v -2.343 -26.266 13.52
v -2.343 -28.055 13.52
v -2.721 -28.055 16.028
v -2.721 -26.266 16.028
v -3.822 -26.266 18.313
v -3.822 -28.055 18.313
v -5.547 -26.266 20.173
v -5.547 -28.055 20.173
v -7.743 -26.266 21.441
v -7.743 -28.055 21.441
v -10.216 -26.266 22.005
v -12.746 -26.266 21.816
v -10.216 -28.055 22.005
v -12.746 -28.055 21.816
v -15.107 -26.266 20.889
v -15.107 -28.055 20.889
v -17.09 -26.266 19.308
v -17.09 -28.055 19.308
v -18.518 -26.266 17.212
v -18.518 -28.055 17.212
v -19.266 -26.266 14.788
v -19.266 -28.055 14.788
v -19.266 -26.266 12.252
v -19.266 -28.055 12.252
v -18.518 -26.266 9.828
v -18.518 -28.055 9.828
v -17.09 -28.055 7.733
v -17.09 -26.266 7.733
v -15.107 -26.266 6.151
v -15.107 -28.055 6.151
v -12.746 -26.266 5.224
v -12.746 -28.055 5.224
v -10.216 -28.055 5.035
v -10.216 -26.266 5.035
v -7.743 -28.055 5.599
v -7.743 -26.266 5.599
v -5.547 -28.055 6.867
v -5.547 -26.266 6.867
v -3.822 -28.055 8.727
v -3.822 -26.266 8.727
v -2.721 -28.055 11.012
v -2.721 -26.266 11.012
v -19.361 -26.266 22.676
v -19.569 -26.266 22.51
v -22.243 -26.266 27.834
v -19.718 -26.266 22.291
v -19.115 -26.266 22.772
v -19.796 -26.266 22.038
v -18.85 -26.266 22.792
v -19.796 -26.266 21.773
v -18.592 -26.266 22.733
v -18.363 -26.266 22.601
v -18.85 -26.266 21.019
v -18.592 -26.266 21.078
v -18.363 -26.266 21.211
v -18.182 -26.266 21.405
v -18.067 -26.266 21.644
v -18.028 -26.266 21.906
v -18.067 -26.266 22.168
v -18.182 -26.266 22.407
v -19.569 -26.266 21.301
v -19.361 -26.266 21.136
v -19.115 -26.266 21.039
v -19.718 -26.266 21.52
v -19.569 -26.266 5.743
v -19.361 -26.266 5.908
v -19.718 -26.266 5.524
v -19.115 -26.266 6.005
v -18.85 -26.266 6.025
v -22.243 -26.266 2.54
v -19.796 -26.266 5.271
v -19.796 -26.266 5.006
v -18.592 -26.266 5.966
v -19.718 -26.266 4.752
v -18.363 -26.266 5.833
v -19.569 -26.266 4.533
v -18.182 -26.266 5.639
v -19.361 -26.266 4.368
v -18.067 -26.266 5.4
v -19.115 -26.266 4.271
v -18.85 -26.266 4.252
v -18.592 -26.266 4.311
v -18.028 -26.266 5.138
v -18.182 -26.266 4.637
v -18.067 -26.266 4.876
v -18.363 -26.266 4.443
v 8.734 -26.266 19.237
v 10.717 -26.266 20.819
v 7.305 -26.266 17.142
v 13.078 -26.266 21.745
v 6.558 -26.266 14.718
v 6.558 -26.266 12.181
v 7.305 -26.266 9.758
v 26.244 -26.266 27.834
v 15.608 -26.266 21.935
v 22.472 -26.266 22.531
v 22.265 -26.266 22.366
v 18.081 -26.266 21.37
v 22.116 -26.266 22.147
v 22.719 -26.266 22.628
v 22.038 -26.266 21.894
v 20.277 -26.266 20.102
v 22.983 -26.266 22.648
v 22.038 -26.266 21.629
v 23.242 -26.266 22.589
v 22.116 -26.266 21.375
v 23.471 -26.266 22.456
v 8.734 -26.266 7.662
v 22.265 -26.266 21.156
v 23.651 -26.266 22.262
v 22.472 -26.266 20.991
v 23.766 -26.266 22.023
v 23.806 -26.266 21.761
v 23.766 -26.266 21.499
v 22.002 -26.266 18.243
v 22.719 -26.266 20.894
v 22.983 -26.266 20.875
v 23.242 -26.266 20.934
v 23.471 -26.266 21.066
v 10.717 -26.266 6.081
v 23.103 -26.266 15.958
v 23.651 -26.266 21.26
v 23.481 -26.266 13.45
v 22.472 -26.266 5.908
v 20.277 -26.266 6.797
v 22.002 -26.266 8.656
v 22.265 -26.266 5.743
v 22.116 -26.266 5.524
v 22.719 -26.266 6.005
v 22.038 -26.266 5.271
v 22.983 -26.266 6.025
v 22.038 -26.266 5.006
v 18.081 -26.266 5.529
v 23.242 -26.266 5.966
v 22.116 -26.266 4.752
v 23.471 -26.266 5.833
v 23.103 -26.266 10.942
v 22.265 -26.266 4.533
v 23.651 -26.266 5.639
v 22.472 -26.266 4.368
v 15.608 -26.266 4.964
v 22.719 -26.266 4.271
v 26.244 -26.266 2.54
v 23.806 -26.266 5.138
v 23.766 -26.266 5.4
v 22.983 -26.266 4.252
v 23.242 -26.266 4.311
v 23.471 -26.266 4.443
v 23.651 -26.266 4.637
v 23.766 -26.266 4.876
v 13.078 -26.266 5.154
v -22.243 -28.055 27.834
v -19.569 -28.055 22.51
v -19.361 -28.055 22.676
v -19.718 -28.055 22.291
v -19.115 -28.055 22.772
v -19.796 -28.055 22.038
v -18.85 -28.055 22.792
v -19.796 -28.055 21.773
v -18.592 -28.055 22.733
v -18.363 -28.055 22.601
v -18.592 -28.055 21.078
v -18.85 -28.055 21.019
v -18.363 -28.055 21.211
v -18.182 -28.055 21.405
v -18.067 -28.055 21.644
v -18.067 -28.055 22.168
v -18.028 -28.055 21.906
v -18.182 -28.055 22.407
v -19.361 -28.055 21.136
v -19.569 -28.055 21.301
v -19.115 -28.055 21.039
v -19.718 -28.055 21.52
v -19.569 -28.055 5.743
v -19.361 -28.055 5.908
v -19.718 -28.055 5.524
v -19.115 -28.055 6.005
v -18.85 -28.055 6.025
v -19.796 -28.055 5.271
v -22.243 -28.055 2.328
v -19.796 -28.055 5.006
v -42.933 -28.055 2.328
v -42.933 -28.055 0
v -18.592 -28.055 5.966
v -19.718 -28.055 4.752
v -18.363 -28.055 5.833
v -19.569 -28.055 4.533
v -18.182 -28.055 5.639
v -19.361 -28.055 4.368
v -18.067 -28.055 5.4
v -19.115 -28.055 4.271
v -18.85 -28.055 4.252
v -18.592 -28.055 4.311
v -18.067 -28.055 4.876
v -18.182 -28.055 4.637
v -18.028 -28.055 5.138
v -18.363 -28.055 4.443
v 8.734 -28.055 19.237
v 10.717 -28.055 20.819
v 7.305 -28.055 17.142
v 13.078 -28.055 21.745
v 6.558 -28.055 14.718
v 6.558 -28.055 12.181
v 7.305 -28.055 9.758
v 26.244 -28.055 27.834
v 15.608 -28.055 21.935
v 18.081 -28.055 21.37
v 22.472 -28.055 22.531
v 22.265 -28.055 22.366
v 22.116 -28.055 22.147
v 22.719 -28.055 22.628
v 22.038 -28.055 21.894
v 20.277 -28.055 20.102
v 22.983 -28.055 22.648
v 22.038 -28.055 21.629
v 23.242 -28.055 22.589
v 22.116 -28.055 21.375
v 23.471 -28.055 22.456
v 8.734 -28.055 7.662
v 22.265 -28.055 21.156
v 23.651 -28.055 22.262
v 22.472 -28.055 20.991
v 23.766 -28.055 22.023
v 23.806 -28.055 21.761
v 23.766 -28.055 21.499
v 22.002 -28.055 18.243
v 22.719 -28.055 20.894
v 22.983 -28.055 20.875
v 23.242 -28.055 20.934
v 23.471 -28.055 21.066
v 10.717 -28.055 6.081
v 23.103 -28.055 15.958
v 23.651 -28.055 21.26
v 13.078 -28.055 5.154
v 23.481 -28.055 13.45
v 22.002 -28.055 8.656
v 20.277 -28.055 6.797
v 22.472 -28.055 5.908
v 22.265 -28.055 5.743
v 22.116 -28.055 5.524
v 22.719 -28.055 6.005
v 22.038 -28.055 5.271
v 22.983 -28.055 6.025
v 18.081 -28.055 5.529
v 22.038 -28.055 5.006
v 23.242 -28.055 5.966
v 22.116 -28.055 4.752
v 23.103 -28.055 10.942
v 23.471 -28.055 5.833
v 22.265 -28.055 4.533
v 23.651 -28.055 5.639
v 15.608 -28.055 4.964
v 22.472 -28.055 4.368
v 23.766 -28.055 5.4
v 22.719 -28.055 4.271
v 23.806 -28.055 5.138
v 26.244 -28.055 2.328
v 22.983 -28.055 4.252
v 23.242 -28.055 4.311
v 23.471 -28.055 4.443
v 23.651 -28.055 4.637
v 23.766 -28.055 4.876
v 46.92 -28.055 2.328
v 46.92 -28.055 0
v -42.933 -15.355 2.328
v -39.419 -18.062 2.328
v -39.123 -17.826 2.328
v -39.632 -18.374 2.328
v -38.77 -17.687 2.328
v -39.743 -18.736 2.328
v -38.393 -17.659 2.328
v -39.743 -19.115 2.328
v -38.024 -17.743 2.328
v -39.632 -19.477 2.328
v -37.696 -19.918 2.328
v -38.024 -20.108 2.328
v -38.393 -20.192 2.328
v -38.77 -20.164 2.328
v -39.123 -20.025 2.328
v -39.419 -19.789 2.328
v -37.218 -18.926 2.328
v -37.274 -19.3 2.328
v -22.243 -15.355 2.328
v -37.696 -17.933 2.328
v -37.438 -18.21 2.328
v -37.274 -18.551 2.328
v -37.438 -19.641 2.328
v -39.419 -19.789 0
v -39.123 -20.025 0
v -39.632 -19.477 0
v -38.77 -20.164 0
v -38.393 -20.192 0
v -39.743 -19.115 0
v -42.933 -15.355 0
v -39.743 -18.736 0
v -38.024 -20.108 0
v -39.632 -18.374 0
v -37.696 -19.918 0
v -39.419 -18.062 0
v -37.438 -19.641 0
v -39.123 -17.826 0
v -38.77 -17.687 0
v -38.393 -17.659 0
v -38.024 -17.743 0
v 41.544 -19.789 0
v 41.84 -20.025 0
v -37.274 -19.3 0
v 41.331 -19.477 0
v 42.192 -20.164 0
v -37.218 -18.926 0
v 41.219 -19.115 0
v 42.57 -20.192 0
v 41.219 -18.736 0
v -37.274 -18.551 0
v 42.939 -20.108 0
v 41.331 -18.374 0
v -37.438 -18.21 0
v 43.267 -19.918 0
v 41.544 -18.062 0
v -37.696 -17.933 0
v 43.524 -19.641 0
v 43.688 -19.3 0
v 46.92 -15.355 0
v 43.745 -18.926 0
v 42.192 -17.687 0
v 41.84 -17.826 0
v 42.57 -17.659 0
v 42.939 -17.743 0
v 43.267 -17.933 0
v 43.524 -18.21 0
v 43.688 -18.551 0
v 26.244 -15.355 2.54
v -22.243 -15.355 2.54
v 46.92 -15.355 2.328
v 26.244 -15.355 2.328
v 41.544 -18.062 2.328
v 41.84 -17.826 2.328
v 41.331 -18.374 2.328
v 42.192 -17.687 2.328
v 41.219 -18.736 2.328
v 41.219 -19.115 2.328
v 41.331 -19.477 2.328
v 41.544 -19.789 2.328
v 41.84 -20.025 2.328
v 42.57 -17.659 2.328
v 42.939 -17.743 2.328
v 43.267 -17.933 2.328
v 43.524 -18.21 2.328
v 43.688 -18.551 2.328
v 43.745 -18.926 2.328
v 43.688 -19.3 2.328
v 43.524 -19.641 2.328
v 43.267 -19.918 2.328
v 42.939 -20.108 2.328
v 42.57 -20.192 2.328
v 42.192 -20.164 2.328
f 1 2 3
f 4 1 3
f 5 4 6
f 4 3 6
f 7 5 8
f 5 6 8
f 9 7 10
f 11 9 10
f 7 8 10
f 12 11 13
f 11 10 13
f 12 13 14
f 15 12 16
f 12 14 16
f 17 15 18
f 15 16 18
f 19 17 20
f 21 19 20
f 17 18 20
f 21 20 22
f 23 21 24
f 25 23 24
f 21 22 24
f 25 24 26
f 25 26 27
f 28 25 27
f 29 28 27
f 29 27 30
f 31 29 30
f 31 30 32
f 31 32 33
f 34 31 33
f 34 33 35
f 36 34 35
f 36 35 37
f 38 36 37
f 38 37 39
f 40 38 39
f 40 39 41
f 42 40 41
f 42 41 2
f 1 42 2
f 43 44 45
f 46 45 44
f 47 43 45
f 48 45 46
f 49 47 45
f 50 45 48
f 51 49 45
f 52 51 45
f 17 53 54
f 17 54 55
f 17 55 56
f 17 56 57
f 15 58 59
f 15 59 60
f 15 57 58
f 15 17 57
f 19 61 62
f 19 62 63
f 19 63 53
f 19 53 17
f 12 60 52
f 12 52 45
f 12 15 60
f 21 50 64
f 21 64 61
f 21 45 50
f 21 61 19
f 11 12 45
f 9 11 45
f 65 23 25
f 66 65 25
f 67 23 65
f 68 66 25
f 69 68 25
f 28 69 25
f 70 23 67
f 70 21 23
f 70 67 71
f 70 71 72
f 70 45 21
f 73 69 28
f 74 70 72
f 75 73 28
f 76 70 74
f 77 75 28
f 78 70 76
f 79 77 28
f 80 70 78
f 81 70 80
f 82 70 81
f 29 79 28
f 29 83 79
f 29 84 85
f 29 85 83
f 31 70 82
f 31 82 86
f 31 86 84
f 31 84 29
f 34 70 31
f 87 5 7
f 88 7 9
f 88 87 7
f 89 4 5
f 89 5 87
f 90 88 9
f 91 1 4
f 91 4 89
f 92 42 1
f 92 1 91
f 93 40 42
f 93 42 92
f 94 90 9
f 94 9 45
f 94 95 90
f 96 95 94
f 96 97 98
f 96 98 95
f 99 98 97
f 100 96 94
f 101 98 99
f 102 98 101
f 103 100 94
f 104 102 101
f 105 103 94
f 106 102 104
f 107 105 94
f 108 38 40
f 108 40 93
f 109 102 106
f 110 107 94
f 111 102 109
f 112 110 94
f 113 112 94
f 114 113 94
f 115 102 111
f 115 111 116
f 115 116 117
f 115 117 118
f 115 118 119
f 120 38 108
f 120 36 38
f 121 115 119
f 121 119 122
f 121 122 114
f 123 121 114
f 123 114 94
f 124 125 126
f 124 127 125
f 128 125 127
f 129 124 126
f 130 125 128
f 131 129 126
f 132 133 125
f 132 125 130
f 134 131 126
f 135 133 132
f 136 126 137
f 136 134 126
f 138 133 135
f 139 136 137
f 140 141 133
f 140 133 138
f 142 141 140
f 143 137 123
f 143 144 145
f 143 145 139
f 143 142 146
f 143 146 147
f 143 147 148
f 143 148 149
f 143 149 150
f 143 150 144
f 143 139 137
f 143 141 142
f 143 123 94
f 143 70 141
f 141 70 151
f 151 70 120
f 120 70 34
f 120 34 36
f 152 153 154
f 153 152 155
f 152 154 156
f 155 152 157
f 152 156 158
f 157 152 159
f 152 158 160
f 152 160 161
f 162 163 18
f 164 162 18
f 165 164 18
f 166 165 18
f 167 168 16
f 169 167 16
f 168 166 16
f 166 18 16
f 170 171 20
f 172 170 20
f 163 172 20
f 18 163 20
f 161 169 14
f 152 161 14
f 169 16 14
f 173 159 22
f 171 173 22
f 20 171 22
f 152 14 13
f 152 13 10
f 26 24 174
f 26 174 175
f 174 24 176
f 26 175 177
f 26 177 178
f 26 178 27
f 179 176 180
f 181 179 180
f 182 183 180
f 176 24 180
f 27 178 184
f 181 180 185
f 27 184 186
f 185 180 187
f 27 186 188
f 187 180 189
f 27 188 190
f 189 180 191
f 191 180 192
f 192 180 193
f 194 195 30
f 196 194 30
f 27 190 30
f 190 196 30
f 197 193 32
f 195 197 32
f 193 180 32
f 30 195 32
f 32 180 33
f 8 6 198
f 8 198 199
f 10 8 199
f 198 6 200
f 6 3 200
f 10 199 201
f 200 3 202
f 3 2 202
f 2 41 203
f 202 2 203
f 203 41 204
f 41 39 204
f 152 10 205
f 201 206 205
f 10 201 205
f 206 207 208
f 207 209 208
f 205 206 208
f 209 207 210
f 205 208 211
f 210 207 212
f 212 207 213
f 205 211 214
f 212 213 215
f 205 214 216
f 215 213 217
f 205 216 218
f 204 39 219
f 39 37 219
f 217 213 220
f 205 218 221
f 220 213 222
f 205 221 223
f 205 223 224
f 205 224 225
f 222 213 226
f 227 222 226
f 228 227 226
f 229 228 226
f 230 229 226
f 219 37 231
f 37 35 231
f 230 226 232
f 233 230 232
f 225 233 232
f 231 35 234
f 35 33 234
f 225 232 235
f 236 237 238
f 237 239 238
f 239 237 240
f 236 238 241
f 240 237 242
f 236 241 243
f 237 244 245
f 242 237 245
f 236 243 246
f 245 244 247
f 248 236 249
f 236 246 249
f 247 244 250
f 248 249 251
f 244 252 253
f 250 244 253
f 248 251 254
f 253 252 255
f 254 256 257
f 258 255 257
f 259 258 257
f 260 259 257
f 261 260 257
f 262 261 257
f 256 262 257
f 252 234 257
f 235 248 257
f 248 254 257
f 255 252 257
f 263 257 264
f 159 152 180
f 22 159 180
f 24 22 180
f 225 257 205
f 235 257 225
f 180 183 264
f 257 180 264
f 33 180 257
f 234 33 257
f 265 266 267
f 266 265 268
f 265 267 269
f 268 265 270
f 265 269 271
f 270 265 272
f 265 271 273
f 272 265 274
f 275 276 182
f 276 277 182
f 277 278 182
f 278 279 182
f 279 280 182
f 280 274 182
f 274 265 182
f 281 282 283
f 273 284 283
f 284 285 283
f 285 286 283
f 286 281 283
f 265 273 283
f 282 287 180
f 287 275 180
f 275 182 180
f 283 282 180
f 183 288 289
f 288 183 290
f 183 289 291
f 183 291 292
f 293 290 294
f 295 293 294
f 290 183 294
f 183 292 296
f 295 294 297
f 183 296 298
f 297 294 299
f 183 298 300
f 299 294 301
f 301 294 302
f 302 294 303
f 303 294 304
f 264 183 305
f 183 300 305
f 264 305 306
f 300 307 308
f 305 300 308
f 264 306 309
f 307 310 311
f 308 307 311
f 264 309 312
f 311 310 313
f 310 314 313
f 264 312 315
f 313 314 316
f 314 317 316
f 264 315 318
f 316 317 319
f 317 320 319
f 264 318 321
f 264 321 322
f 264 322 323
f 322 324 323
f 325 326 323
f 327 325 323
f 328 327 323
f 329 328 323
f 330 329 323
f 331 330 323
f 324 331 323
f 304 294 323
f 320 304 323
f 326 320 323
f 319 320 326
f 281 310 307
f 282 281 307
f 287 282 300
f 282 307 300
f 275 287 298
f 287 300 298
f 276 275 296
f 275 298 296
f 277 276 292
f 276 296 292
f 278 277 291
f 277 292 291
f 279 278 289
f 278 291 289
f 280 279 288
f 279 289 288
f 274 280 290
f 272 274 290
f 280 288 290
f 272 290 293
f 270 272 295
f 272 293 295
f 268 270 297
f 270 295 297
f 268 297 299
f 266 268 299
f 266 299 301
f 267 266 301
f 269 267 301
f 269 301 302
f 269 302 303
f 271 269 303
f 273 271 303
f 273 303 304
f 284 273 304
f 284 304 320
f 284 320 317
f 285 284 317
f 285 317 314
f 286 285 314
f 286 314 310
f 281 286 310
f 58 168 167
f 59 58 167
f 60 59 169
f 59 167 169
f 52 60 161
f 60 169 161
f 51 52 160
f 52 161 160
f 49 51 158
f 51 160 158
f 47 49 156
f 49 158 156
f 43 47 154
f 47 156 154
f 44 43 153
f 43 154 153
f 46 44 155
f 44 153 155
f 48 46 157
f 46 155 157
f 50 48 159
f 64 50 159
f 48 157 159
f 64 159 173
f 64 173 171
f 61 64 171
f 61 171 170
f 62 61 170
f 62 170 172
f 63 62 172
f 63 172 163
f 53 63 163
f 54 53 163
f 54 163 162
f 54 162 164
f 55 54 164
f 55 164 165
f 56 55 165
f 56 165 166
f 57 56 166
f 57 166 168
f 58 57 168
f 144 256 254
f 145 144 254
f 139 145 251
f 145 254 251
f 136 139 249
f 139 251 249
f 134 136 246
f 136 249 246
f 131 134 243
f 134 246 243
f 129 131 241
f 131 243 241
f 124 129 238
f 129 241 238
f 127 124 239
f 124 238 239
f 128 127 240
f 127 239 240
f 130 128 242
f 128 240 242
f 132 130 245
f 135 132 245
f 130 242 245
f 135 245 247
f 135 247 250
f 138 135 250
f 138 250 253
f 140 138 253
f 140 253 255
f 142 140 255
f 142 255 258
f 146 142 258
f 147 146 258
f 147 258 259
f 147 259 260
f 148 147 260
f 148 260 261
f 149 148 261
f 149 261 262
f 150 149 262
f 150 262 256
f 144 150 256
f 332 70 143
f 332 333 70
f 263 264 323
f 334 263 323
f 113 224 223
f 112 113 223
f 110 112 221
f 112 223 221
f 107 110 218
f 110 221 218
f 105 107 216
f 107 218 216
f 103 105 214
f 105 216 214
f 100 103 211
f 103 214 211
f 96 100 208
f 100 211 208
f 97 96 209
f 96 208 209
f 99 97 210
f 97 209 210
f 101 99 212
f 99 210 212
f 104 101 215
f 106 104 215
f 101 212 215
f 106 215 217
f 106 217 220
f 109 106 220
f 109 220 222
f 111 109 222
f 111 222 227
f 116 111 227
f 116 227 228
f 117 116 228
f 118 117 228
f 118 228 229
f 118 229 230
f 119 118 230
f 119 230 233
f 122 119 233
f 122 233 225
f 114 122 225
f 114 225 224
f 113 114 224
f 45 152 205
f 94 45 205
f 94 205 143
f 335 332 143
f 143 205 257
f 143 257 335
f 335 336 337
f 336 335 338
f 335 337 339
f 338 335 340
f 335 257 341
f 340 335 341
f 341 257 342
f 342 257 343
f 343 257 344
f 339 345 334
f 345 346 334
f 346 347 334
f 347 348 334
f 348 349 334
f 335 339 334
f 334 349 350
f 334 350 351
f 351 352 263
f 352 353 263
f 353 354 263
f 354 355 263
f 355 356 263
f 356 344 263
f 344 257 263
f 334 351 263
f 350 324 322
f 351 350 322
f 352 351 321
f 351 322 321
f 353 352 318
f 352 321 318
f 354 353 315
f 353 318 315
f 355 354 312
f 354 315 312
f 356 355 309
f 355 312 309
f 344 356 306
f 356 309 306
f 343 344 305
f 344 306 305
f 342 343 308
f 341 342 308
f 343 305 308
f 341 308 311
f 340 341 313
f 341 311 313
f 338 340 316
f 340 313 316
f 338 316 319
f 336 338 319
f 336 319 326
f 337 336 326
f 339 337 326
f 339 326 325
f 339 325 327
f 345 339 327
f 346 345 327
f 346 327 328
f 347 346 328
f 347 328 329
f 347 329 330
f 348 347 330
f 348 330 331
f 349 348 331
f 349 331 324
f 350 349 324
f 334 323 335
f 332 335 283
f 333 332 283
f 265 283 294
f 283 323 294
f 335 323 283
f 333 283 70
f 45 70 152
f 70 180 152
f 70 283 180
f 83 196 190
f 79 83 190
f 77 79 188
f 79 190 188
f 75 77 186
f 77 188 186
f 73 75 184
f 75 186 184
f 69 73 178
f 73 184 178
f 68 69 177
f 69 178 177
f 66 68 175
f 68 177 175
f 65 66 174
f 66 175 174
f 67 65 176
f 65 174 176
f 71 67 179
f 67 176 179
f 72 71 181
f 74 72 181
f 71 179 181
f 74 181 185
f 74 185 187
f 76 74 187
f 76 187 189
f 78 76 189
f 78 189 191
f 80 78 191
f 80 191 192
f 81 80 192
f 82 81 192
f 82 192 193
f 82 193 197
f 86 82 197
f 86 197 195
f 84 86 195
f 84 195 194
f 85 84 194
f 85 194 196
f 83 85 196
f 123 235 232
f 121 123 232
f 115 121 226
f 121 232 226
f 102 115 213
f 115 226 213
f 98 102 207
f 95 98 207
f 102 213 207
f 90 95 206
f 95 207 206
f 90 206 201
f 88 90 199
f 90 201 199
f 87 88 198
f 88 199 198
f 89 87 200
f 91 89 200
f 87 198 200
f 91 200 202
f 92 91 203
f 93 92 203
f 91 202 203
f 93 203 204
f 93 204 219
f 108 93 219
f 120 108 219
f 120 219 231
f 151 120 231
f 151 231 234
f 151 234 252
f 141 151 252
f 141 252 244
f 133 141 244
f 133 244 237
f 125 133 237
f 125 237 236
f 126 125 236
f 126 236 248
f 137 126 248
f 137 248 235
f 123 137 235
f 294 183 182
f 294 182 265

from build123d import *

# Parameters (mm, degrees)
F1_DEPTH = 2.54
F2_W     = 89.8525
F2_H     = 1.7887626846
F3_DEPTH = 50.8
F4_R     = 8.509
F4_R_2   = 0.889
F4_W     = 48.4873057247
F4_H     = 25.5061189608
F5_DEPTH = 25.4


# Not quite as in the source:
# - a feature names something its author has since deleted; it is built from what else it names


with BuildPart() as f1:
    # F0 (on Top) → F1 (new body)
    with BuildSketch(Plane.XY):
        with BuildLine():
            Line((46.9198958446, -15.3550693233), (-42.9326041554, -15.3550693233))
            Line((-42.9326041554, -15.3550693233), (-42.9326041554, -18.9255226487))
            Line((-42.9326041554, -18.9255226487), (-39.7576041554, -18.9255226487))
            ThreePointArc((-39.7576041554, -18.9255226487), (-38.4876041554, -17.6555226487), (-37.2176041554, -18.9255226487))
            Line((-37.2176041554, -18.9255226487), (41.2048958446, -18.9255226487))
            ThreePointArc((41.2048958446, -18.9255226487), (42.4748958446, -17.6555226487), (43.7448958446, -18.9255226487))
            Line((43.7448958446, -18.9255226487), (46.9198958446, -18.9255226487))
            Line((46.9198958446, -18.9255226487), (46.9198958446, -15.3550693233))
        make_face()
        with BuildLine():
            Line((-39.7576041554, -18.9255226487), (-42.9326041554, -18.9255226487))
            Line((-42.9326041554, -18.9255226487), (-42.9326041554, -28.0550693233))
            Line((-42.9326041554, -28.0550693233), (46.9198958446, -28.0550693233))
            Line((46.9198958446, -28.0550693233), (46.9198958446, -18.9255226487))
            Line((46.9198958446, -18.9255226487), (43.7448958446, -18.9255226487))
            ThreePointArc((43.7448958446, -18.9255226487), (42.4748958446, -20.1955226487), (41.2048958446, -18.9255226487))
            Line((41.2048958446, -18.9255226487), (-37.2176041554, -18.9255226487))
            ThreePointArc((-37.2176041554, -18.9255226487), (-38.4876041554, -20.1955226487), (-39.7576041554, -18.9255226487))
        make_face()
    extrude(amount=F1_DEPTH)

    # F2 (on face) → F3 (join)
    with BuildSketch(Plane.XY.offset(2.54)):
        with Locations((1.9936458446, -27.160687981)):
            Rectangle(F2_W, F2_H)
    extrude(amount=F3_DEPTH)

    # F4 (on face) → F5 (cut)
    with BuildSketch(Plane.XZ.offset(28.0550693233)):
        with Locations((-10.8520889408, 13.5200908117)):
            Circle(F4_R)
        with Locations((14.9718186097, 13.4496116212)):
            Circle(F4_R)
        with Locations((-18.9169041554, 21.9057271107)):
            Circle(F4_R_2)
        with Locations((-18.9169041554, 5.1380908117)):
            Circle(F4_R_2)
        with Locations((22.9168958446, 5.1380908117)):
            Circle(F4_R_2)
        with Locations((22.9168958446, 21.7611324307)):
            Circle(F4_R_2)
        Polygon((46.9198958446, 53.34), (26.2442958446, 53.34), (26.2442958446, 27.8338810392), (26.2442958446, 2.3277620785), (46.9198958446, 2.3277620785), align=None)
        Polygon((-22.2430098802, 53.34), (-42.9326041554, 53.34), (-42.9326041554, 2.3277620785), (-22.2430098802, 2.3277620785), (-22.2430098802, 27.8338810392), align=None)
        with Locations((2.0006429822, 40.5869405196)):
            Rectangle(F4_W, F4_H)
    extrude(amount=-F5_DEPTH, mode=Mode.SUBTRACT)


solid = f1.part
